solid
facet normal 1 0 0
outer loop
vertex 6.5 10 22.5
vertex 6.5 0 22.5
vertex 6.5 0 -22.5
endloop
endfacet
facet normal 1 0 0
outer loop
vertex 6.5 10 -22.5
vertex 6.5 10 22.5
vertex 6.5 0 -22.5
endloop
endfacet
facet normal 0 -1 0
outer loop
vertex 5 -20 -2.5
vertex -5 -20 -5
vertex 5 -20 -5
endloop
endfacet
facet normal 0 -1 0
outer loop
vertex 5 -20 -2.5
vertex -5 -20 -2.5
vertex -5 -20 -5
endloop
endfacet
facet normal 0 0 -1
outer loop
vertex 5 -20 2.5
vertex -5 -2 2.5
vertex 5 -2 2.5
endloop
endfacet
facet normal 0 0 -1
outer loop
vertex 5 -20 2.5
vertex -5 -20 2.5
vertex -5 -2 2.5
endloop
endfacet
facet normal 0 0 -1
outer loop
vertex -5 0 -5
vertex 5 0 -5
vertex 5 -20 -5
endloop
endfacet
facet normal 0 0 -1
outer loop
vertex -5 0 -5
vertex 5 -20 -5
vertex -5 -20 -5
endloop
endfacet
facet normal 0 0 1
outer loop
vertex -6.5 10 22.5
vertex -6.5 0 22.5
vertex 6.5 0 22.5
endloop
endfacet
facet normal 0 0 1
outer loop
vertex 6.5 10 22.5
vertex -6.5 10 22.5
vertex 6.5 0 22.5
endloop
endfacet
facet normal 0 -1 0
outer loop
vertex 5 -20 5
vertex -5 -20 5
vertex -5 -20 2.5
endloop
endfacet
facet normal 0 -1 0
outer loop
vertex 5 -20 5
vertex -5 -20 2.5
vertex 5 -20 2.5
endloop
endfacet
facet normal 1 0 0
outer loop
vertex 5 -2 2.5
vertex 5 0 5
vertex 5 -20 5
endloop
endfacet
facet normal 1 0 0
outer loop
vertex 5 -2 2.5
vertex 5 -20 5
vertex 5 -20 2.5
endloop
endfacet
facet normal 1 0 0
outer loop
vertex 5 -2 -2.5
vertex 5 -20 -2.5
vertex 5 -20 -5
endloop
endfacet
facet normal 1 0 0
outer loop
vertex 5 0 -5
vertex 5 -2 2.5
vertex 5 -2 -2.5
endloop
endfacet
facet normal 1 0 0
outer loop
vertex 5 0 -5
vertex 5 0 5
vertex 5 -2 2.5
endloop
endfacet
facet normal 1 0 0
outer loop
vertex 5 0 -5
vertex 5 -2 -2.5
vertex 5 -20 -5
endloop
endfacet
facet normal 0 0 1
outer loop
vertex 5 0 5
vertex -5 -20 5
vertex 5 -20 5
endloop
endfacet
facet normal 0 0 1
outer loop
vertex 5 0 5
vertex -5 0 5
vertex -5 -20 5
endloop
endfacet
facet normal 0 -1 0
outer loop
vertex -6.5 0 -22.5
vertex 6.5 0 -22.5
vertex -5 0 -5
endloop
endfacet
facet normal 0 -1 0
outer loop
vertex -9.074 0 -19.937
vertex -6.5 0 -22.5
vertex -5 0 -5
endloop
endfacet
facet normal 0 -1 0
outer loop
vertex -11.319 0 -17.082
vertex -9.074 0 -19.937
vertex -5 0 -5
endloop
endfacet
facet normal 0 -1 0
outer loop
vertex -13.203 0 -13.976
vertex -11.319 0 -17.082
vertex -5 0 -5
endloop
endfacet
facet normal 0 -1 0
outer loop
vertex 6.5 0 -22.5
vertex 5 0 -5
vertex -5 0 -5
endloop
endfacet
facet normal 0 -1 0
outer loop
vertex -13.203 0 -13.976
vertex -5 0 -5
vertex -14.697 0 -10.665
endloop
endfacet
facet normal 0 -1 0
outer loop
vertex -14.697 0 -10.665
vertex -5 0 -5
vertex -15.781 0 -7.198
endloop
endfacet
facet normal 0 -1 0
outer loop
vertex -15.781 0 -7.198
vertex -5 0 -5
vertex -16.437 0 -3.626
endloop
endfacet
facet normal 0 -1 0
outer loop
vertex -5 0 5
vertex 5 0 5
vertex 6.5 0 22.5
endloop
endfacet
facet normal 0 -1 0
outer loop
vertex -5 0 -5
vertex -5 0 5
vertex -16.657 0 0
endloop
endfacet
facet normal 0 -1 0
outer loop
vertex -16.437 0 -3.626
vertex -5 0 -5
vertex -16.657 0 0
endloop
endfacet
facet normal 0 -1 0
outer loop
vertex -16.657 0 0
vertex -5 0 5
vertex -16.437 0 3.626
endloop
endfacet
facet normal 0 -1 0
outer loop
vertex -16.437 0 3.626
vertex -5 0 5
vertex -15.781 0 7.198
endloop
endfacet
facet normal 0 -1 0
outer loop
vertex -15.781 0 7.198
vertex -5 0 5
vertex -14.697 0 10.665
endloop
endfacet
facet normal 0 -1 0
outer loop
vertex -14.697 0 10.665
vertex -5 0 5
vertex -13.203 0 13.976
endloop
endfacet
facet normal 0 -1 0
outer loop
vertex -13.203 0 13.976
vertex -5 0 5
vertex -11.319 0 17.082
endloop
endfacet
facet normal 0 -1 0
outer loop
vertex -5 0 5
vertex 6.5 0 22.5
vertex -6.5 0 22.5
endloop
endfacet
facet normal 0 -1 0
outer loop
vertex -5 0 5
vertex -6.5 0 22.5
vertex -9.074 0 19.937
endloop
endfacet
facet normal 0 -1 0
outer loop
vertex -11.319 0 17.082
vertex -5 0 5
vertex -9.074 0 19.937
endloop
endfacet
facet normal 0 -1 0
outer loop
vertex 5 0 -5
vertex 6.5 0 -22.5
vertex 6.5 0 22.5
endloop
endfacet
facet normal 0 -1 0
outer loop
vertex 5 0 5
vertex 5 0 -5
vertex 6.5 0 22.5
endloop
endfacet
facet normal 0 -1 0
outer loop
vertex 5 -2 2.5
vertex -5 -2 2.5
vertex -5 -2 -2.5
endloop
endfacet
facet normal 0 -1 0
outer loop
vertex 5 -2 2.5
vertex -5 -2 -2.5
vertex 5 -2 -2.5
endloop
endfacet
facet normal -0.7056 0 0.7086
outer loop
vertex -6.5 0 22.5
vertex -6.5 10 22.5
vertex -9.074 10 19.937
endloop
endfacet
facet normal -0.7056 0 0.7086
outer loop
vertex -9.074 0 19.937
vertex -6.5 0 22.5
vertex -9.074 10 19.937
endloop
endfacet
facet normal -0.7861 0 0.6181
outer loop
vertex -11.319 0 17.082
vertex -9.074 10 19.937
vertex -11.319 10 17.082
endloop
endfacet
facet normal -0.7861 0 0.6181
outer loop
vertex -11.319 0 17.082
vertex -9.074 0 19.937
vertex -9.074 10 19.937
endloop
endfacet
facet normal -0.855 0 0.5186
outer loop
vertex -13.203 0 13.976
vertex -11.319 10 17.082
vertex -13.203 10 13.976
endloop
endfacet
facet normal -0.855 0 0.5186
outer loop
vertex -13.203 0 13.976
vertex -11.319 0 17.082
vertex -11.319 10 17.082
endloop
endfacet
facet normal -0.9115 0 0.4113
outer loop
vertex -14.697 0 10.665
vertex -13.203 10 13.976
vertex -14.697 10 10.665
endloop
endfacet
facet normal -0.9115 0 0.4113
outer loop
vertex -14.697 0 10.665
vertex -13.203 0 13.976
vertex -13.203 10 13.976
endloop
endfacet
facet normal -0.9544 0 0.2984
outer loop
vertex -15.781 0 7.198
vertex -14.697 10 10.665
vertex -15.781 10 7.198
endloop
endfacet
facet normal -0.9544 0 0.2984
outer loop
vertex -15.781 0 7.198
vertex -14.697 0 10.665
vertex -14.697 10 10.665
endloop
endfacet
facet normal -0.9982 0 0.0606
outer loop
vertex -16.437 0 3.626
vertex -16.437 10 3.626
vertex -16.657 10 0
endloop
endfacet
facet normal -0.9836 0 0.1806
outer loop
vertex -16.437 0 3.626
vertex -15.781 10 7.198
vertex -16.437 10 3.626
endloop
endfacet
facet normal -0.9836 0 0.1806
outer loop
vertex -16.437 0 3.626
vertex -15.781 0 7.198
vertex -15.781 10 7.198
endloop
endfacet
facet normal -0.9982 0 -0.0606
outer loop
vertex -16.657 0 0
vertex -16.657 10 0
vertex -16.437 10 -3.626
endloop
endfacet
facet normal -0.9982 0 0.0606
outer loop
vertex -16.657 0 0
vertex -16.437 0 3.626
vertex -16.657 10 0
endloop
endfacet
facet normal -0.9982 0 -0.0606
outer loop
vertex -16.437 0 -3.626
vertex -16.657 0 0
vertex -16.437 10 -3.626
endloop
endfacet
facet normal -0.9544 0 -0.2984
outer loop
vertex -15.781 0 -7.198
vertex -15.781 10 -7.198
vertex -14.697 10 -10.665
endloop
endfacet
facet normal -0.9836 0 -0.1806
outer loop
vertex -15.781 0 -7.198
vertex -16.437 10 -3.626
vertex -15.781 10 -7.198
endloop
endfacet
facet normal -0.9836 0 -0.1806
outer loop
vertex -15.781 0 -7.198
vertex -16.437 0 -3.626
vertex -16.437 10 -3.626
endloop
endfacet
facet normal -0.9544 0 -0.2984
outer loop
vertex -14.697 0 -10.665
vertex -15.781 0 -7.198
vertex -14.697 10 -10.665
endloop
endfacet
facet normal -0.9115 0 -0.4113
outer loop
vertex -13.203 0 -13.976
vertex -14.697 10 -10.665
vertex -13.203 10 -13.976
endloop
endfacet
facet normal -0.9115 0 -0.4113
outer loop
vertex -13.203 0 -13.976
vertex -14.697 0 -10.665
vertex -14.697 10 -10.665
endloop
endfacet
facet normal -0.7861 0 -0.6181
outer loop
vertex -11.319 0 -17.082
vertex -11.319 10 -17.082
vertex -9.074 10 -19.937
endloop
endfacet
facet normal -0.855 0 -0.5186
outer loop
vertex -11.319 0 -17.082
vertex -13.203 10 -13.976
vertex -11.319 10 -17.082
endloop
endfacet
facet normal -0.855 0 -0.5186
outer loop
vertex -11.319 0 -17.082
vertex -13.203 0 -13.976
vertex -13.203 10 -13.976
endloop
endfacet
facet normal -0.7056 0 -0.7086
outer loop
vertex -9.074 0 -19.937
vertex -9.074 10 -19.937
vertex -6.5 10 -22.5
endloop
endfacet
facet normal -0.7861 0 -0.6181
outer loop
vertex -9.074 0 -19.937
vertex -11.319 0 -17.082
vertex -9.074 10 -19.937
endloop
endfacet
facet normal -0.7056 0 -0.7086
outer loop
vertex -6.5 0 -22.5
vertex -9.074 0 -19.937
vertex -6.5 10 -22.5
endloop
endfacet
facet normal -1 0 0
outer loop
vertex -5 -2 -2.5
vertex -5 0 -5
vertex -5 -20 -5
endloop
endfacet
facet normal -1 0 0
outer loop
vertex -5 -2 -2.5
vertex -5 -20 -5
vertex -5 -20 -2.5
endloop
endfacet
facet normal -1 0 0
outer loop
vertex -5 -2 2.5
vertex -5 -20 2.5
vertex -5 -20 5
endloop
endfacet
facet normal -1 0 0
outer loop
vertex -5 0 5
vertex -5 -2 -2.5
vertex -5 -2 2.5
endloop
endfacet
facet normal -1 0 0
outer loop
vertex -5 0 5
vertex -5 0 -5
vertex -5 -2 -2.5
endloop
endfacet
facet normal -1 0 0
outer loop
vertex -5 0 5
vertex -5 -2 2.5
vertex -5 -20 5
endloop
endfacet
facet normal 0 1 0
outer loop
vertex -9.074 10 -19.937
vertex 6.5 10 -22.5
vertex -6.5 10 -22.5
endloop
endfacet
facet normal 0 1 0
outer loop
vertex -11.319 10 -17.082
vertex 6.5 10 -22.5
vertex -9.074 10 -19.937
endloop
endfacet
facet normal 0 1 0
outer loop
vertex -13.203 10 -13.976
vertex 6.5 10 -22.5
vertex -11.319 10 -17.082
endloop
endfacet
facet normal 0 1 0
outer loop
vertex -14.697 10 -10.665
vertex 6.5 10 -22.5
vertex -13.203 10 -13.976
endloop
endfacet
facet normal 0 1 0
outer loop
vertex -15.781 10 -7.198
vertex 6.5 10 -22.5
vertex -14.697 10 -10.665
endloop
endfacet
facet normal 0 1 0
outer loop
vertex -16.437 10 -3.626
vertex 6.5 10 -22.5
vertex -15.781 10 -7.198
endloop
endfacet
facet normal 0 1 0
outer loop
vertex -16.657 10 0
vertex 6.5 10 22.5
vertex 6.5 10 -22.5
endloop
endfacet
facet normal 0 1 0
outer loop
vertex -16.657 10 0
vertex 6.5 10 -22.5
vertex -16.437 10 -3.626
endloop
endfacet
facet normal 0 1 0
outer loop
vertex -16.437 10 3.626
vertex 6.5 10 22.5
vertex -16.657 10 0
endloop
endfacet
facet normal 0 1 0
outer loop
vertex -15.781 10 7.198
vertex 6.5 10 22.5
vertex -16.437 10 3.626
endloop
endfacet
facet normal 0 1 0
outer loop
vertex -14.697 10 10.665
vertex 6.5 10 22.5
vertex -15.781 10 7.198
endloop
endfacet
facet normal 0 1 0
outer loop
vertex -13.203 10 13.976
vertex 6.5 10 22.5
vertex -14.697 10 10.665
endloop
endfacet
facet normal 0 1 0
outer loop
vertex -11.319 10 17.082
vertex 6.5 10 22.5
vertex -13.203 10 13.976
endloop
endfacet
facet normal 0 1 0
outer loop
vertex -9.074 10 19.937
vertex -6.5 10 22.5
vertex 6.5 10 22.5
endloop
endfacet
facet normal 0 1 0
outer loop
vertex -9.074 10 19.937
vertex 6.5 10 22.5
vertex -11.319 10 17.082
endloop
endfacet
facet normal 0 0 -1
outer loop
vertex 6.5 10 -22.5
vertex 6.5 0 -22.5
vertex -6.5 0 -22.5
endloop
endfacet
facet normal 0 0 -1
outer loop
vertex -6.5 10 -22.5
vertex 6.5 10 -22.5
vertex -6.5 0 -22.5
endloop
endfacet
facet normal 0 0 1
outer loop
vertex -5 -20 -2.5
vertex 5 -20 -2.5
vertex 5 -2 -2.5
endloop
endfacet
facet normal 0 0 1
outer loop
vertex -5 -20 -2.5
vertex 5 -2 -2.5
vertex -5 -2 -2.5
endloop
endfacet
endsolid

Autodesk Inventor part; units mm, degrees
ref_plane "YZ Plane" through (0, 0, 0) normal (1, 0, 0) x (0, 1, 0)
ref_plane "XZ Plane" through (0, 0, 0) normal (0, 1, 0) x (-1, 0, 0)
ref_plane "XY Plane" through (0, 0, 0) normal (0, 0, 1) x (1, 0, 0)
sketch "Sketch1" plane through (0, 0, 0) normal (0, 1, 0) x (-1, 0, 0)
  line L0 (-5, 5) -> (5, 5) construction
  line L1 (5, 5) -> (5, -5) construction
  line L2 (5, -5) -> (-5, -5) construction
  line L3 (-5, -5) -> (-5, 5) construction
  line L4 (-5, 5) -> (5, -5) construction
  line L5 (5, 5) -> (-5, -5) construction
  line L6 (6.5, 22.5) -> (-6.5, 22.5)
  line L7 (-6.5, 22.5) -> (-6.5, -22.5)
  line L8 (-6.5, -22.5) -> (6.5, -22.5)
  line L9 (6.5, 22.5) -> (-6.5, -22.5) construction
  line L10 (-6.5, 22.5) -> (6.5, -22.5) construction
  arc A0 (6.5, -22.5) -> (6.5, 22.5) centre (-13.3431, 0) ccw
  point P0 (0, 0)
  dimension "d0" = 10
  dimension "d1" = 10
  dimension "d2" = 13
  dimension "d3" = 45
  dimension "d4" = 30
extrude "Extrusion1" add sketch "Sketch1" along normal blind 10
sketch "Sketch2" plane through (0, 0, 0) normal (0, -1, 0) x (1, 0, 0)
  line L0 (-5, 5) -> (5, 5)
  line L1 (5, 5) -> (5, -5)
  line L2 (5, -5) -> (-5, -5)
  line L3 (-5, -5) -> (-5, 5)
  line L4 (-5, 5) -> (5, -5) construction
  line L5 (5, 5) -> (-5, -5) construction
  point P0 (0, 0)
  dimension "d7" = 10
  dimension "d8" = 10
extrude "Extrusion2" add sketch "Sketch2" along normal blind 20
sketch "Sketch4" plane through (0, -20, 0) normal (0, -1, 0) x (1, 0, 0)
  line L0 (5, 5) -> (5, -5) projected
  line L1 (-5, 2.5) -> (5, 2.5)
  line L2 (5, 2.5) -> (5, -2.5)
  line L3 (5, -2.5) -> (-5, -2.5)
  line L4 (-5, -2.5) -> (-5, 2.5)
  line L5 (-5, 2.5) -> (5, -2.5) construction
  line L6 (5, 2.5) -> (-5, -2.5) construction
  line L7 (5, 5) -> (-5, 5) projected
  line L8 (-5, 5) -> (-5, -5) projected
  point P0 (0, 0)
  point P1 (5, 0)
  dimension "d11" = 5
  dimension "d14" = 10
extrude "Extrusion3" cut sketch "Sketch4" against normal blind 18 contours L0 L3 L4 L1
properties part number "holder_for_wire"
